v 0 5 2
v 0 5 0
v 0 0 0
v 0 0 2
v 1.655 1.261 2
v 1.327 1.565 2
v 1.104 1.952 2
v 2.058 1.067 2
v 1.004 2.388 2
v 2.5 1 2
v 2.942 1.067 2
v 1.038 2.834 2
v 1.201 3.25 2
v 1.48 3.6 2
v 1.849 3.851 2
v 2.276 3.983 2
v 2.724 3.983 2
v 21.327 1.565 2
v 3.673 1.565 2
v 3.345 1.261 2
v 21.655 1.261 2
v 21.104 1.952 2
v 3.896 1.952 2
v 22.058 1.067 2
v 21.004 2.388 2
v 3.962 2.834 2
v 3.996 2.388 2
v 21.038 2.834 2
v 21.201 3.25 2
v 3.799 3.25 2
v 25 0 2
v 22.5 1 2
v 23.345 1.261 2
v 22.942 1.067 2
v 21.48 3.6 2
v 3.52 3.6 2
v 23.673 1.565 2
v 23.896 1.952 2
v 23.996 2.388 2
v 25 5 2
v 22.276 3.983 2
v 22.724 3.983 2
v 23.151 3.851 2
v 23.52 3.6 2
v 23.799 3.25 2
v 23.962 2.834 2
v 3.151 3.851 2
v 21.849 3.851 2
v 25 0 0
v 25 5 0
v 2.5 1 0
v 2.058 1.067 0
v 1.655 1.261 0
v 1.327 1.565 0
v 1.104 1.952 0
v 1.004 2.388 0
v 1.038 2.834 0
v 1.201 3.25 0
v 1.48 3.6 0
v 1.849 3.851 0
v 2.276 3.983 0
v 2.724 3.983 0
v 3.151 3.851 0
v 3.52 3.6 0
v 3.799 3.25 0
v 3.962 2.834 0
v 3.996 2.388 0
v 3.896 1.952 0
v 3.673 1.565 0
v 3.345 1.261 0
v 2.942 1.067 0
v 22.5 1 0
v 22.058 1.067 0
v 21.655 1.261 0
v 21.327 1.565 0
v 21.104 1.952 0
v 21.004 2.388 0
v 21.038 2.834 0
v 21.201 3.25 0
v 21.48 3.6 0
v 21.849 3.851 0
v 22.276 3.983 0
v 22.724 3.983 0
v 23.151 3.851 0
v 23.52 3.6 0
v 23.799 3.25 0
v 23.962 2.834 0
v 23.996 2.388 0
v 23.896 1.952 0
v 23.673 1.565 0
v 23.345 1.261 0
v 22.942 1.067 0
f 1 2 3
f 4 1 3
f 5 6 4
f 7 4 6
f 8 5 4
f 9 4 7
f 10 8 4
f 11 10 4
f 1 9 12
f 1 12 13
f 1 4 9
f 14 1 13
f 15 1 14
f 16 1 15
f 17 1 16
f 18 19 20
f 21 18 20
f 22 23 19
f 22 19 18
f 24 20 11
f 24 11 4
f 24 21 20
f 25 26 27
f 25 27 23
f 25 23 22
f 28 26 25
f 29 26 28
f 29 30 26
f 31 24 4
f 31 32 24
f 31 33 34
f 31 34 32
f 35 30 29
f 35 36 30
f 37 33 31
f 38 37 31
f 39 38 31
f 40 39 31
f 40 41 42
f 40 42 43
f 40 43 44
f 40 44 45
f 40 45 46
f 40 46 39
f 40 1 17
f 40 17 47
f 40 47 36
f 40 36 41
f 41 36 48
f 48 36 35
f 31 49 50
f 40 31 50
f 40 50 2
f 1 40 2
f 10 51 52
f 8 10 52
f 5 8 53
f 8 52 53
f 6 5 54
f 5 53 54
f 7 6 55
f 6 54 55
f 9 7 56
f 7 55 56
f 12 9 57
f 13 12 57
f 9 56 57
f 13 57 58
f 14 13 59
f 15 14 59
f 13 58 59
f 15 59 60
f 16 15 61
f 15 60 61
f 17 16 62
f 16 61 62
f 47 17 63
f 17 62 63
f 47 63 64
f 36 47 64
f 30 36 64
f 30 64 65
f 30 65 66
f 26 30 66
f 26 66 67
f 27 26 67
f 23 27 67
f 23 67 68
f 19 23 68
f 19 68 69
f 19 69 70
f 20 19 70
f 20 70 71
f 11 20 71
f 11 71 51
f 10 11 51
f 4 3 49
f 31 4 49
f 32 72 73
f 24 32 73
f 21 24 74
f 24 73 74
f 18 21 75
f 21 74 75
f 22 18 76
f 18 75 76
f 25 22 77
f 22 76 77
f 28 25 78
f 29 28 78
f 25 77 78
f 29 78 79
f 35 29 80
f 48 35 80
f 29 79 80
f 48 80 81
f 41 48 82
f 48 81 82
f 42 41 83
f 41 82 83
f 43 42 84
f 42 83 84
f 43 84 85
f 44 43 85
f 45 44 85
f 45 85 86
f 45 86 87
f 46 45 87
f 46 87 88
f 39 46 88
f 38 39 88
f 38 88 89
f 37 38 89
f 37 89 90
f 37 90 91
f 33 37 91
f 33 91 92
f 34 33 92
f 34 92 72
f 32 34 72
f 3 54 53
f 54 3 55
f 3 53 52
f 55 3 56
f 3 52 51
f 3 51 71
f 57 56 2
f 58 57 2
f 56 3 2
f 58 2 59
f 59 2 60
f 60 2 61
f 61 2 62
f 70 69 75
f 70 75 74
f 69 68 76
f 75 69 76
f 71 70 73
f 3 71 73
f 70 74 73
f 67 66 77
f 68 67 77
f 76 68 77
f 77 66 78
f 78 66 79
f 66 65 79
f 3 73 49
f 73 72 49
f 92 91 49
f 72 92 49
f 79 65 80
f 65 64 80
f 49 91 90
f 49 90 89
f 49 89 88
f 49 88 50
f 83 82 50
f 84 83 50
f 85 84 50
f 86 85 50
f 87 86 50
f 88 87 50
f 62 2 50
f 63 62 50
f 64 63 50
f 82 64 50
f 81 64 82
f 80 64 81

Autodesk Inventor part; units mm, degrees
ref_plane "YZ Plane" through (0, 0, 0) normal (1, 0, 0) x (0, 1, 0)
ref_plane "XZ Plane" through (0, 0, 0) normal (0, 1, 0) x (-1, 0, 0)
ref_plane "XY Plane" through (0, 0, 0) normal (0, 0, 1) x (1, 0, 0)
sketch "スケッチ1" plane through (0, 0, 0) normal (0, 0, 1) x (1, 0, 0)
  line L0 (0, 0) -> (25, 0)
  line L1 (25, 0) -> (25, 5)
  line L2 (25, 5) -> (0, 5)
  line L3 (0, 5) -> (0, 0)
  dimension "d0" = 25
  dimension "d1" = 5
extrude "押し出し1" add sketch "スケッチ1" along normal blind 2
sketch "スケッチ2" plane through (0, 0, 2) normal (0, 0, 1) x (1, 0, 0)
  line L0 (0, 5) -> (0, 0) projected
  line L1 (25, 0) -> (25, 5) projected
  point P0 (2.5, 2.5)
  point P1 (22.5, 2.5)
  dimension "d4" = 2.5
  dimension "d5" = 2.5
hole "穴1" at (2.5, 2.5, 2) at (22.5, 2.5, 2) direction (0, 0, -1) diameter 3 end through all
properties part number "短いの"
